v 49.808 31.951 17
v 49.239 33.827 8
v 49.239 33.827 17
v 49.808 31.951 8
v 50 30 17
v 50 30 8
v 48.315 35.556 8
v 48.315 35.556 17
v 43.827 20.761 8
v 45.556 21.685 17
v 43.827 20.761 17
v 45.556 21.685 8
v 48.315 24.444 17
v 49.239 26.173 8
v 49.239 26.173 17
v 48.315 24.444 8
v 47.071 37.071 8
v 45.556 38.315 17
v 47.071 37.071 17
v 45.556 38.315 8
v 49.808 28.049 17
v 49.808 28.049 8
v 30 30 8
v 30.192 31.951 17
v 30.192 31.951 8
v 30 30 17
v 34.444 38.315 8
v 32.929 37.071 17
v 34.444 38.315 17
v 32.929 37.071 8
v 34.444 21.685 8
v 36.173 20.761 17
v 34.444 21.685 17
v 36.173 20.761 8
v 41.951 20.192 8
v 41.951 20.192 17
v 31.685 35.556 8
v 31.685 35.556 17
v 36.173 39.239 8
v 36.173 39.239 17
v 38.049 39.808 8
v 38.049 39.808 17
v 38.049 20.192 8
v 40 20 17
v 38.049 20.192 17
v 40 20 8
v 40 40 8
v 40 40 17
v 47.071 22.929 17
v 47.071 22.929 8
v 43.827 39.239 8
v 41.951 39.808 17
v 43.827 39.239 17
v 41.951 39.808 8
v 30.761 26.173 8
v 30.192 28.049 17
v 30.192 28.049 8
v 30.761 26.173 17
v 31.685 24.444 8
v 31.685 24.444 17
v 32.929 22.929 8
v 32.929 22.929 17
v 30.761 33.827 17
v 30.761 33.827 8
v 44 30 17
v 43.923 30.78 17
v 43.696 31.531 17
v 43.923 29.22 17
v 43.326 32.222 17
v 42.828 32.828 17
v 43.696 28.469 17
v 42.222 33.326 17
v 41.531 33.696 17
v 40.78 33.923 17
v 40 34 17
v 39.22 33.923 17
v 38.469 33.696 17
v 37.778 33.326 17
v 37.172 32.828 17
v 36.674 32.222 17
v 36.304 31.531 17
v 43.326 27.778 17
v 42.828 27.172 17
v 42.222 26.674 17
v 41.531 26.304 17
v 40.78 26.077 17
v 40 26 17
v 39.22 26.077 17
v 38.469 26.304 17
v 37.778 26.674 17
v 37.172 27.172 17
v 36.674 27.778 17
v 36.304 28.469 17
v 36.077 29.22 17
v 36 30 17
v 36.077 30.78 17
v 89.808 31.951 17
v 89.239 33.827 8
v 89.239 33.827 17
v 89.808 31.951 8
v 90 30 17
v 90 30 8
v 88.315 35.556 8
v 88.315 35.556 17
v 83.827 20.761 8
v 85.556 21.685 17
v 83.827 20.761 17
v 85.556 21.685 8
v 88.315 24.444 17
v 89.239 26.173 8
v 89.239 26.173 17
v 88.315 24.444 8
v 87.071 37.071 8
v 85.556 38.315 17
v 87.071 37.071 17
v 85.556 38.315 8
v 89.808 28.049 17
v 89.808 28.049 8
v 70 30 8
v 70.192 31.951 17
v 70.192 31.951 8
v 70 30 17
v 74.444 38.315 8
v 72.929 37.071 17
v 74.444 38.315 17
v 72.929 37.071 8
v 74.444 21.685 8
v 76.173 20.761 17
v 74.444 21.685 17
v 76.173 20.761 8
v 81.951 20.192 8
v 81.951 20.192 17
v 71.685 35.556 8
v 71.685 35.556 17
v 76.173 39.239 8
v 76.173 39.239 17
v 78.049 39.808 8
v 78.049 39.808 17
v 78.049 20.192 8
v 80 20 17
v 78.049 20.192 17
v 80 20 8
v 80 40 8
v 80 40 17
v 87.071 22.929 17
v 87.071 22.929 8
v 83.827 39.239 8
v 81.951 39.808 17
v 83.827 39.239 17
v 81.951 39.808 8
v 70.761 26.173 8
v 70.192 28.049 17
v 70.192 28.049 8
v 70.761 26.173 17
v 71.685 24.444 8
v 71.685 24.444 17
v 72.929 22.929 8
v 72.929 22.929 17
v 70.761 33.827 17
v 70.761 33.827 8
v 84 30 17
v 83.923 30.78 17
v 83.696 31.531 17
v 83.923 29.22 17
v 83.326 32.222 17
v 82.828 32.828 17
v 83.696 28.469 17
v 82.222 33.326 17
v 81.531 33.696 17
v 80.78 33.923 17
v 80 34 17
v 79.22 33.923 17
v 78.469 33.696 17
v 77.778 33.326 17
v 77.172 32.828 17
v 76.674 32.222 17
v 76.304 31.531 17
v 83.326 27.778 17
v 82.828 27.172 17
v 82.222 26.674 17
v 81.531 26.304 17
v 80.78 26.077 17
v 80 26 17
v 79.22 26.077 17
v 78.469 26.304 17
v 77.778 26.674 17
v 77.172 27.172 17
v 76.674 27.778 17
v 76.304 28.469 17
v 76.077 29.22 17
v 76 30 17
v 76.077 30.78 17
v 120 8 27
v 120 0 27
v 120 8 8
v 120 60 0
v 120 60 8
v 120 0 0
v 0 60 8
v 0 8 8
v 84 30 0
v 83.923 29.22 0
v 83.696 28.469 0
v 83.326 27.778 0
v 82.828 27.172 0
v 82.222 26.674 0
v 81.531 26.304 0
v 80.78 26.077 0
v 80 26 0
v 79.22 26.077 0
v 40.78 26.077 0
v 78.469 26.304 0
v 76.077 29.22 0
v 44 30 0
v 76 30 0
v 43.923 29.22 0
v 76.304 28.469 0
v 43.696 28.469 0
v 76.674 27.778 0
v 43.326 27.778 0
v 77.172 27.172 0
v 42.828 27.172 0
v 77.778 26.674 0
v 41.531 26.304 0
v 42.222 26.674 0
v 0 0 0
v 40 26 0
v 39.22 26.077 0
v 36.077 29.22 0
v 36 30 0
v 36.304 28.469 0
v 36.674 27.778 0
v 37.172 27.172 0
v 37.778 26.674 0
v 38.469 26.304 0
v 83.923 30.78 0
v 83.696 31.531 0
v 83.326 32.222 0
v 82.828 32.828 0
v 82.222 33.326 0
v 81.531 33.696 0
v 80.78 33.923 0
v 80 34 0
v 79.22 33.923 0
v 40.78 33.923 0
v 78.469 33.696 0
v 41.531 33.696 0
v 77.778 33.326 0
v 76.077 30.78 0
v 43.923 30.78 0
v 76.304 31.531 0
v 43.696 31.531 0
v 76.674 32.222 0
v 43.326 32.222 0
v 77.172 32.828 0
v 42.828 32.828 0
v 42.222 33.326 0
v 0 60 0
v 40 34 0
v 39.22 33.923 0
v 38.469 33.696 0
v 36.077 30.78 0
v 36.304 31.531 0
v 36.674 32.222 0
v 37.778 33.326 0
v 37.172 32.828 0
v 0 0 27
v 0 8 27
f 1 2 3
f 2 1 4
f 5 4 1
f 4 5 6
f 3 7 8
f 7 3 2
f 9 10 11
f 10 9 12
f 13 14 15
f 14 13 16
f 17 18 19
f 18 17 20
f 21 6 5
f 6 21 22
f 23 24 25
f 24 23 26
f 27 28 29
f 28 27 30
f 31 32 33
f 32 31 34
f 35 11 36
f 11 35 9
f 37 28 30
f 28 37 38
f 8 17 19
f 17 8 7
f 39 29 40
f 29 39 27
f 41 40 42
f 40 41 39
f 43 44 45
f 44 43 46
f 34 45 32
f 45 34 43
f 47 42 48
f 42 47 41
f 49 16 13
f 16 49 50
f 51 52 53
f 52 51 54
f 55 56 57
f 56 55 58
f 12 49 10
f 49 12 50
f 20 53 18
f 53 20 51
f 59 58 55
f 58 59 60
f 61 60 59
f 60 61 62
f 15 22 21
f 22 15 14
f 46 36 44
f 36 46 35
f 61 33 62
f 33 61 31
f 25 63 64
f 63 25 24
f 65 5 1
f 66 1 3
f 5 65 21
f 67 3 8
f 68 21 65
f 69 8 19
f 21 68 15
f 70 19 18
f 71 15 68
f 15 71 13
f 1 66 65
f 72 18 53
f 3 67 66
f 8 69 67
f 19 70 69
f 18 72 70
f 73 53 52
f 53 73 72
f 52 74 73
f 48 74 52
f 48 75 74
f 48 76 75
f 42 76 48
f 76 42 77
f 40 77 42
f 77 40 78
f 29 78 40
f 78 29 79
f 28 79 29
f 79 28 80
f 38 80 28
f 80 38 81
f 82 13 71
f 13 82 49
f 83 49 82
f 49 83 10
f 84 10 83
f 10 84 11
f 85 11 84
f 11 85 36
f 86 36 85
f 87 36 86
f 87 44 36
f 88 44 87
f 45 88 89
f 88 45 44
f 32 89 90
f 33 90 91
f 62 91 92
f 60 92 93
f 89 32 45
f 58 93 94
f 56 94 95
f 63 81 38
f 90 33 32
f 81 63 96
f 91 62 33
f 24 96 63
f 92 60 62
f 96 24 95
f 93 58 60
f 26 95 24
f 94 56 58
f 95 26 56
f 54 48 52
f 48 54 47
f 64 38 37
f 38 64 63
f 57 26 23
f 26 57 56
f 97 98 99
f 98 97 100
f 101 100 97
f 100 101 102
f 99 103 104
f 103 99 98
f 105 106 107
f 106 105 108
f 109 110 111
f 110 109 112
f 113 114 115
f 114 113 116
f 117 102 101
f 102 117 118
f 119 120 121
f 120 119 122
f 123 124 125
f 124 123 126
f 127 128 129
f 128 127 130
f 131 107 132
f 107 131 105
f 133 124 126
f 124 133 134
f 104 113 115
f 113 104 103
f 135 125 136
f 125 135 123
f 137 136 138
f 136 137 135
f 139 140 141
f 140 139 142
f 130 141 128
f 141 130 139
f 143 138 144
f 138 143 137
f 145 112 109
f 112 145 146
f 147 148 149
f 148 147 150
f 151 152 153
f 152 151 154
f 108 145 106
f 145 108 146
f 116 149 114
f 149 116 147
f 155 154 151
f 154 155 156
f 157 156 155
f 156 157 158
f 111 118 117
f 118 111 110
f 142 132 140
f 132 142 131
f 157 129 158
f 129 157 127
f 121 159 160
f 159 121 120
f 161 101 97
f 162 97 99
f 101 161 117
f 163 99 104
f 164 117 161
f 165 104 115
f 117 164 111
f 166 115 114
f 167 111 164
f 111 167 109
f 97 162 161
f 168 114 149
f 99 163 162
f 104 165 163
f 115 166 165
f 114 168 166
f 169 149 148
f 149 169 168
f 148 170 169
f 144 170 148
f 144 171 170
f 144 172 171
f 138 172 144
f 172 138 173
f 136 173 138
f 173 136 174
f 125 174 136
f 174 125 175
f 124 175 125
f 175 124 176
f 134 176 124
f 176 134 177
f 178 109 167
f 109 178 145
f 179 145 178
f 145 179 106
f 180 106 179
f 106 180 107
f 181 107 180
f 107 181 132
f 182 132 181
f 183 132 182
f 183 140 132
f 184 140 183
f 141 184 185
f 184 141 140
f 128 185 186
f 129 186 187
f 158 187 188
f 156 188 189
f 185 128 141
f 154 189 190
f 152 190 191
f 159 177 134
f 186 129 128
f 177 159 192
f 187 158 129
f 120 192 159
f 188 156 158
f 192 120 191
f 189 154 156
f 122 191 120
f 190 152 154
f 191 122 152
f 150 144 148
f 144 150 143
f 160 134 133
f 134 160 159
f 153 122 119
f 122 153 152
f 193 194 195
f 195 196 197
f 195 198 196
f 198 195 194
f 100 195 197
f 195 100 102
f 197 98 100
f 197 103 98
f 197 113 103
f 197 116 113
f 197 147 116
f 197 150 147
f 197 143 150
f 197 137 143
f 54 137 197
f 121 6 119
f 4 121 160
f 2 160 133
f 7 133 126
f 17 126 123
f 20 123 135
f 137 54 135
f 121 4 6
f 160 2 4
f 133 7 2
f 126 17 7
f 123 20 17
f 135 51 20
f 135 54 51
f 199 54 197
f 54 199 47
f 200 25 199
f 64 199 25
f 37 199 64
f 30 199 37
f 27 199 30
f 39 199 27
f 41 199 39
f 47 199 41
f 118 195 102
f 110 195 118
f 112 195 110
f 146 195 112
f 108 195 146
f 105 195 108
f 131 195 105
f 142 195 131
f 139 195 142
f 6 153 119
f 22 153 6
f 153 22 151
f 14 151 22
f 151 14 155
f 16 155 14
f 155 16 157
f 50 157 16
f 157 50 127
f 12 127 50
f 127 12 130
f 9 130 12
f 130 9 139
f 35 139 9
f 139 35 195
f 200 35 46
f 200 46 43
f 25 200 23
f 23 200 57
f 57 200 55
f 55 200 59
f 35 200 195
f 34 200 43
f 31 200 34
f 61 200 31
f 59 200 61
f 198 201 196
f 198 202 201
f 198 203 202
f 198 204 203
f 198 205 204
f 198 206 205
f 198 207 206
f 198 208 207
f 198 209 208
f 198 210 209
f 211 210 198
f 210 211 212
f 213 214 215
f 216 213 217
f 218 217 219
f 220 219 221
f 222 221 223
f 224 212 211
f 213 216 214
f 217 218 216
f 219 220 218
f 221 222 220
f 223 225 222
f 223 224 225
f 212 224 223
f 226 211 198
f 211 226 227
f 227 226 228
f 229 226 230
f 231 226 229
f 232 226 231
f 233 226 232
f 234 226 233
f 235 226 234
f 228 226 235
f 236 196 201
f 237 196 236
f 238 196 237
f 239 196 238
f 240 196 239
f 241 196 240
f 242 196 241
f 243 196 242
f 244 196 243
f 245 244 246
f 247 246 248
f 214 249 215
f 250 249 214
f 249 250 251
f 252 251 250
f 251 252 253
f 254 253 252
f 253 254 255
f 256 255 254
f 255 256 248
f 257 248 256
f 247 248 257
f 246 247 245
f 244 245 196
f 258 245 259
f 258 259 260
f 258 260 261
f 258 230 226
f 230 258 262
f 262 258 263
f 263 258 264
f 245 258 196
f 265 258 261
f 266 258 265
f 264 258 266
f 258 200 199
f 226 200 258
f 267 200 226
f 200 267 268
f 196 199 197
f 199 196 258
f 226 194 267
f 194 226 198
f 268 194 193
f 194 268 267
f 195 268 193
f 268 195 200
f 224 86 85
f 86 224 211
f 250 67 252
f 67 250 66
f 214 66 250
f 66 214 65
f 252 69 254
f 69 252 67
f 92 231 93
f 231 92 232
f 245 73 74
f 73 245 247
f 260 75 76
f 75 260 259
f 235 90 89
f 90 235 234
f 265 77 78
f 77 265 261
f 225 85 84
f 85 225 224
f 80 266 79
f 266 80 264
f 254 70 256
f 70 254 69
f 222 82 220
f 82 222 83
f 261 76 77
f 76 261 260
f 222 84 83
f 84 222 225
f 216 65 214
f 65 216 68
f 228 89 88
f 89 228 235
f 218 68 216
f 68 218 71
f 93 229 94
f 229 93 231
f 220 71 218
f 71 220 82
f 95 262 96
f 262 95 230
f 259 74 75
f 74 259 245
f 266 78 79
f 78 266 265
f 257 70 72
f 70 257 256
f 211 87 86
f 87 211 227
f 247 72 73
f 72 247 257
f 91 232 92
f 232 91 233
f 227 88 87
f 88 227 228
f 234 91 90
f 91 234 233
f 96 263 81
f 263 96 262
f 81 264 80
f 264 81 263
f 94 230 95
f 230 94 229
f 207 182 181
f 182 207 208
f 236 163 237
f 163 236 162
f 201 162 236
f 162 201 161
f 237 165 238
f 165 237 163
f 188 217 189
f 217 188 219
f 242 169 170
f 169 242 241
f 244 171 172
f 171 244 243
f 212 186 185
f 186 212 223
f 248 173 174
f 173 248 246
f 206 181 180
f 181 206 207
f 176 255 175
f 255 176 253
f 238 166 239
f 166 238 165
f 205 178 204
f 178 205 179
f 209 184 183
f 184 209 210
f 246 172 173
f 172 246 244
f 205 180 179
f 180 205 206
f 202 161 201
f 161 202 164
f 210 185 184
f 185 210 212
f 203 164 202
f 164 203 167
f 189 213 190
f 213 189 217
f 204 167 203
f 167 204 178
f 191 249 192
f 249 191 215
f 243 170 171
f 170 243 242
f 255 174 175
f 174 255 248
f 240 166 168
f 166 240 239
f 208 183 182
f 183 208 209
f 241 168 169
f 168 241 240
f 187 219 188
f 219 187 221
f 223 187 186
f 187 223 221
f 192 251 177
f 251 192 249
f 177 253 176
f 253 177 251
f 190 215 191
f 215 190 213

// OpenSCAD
$fn = 32;

// ----------------------------------------------------------------------
// Drill jig: fence jig
// ----------------------------------------------------------------------

// --- parameters (mm) ---
plate_l = 120;            // plate length, X
plate_w = 60;             // plate width, Y
plate_t = 8;              // plate thickness
boss_d = 20;              // guide boss diameter
boss_h = 10;              // boss height above the plate
guide_d = 8;              // guide hole diameter
boss_pitch = 40;          // boss pitch
fence_h = 20;             // fence height above the plate
fence_t = 8;              // fence thickness
fit_tol = 0.1;            // tolerance for press fits, mm
free_tol = 0.5;           // tolerance for clearance fits, mm

n_boss = 2;  // guide bosses
boss_x0 = (plate_l - (n_boss - 1) * boss_pitch) / 2;  // first boss X
boss_top = plate_t - 1 + boss_h;  // boss crown height
fence_top = plate_t - 1 + fence_h;  // fence crown height
total_h = max([fence_top, boss_top]);  // overall height

difference() {
  union() {
  cube([plate_l, plate_w, plate_t]);
  for (i = [0 : n_boss - 1])
    translate([boss_x0 + i * boss_pitch, plate_w / 2, plate_t - 1])
      cylinder(h = boss_h, d = boss_d);
  translate([0, 0, plate_t - 1]) cube([plate_l, fence_t, fence_h]);
  }
  for (i = [0 : n_boss - 1])
    translate([boss_x0 + i * boss_pitch, plate_w / 2, -1])
      cylinder(h = plate_t + boss_h, d = guide_d);
}
